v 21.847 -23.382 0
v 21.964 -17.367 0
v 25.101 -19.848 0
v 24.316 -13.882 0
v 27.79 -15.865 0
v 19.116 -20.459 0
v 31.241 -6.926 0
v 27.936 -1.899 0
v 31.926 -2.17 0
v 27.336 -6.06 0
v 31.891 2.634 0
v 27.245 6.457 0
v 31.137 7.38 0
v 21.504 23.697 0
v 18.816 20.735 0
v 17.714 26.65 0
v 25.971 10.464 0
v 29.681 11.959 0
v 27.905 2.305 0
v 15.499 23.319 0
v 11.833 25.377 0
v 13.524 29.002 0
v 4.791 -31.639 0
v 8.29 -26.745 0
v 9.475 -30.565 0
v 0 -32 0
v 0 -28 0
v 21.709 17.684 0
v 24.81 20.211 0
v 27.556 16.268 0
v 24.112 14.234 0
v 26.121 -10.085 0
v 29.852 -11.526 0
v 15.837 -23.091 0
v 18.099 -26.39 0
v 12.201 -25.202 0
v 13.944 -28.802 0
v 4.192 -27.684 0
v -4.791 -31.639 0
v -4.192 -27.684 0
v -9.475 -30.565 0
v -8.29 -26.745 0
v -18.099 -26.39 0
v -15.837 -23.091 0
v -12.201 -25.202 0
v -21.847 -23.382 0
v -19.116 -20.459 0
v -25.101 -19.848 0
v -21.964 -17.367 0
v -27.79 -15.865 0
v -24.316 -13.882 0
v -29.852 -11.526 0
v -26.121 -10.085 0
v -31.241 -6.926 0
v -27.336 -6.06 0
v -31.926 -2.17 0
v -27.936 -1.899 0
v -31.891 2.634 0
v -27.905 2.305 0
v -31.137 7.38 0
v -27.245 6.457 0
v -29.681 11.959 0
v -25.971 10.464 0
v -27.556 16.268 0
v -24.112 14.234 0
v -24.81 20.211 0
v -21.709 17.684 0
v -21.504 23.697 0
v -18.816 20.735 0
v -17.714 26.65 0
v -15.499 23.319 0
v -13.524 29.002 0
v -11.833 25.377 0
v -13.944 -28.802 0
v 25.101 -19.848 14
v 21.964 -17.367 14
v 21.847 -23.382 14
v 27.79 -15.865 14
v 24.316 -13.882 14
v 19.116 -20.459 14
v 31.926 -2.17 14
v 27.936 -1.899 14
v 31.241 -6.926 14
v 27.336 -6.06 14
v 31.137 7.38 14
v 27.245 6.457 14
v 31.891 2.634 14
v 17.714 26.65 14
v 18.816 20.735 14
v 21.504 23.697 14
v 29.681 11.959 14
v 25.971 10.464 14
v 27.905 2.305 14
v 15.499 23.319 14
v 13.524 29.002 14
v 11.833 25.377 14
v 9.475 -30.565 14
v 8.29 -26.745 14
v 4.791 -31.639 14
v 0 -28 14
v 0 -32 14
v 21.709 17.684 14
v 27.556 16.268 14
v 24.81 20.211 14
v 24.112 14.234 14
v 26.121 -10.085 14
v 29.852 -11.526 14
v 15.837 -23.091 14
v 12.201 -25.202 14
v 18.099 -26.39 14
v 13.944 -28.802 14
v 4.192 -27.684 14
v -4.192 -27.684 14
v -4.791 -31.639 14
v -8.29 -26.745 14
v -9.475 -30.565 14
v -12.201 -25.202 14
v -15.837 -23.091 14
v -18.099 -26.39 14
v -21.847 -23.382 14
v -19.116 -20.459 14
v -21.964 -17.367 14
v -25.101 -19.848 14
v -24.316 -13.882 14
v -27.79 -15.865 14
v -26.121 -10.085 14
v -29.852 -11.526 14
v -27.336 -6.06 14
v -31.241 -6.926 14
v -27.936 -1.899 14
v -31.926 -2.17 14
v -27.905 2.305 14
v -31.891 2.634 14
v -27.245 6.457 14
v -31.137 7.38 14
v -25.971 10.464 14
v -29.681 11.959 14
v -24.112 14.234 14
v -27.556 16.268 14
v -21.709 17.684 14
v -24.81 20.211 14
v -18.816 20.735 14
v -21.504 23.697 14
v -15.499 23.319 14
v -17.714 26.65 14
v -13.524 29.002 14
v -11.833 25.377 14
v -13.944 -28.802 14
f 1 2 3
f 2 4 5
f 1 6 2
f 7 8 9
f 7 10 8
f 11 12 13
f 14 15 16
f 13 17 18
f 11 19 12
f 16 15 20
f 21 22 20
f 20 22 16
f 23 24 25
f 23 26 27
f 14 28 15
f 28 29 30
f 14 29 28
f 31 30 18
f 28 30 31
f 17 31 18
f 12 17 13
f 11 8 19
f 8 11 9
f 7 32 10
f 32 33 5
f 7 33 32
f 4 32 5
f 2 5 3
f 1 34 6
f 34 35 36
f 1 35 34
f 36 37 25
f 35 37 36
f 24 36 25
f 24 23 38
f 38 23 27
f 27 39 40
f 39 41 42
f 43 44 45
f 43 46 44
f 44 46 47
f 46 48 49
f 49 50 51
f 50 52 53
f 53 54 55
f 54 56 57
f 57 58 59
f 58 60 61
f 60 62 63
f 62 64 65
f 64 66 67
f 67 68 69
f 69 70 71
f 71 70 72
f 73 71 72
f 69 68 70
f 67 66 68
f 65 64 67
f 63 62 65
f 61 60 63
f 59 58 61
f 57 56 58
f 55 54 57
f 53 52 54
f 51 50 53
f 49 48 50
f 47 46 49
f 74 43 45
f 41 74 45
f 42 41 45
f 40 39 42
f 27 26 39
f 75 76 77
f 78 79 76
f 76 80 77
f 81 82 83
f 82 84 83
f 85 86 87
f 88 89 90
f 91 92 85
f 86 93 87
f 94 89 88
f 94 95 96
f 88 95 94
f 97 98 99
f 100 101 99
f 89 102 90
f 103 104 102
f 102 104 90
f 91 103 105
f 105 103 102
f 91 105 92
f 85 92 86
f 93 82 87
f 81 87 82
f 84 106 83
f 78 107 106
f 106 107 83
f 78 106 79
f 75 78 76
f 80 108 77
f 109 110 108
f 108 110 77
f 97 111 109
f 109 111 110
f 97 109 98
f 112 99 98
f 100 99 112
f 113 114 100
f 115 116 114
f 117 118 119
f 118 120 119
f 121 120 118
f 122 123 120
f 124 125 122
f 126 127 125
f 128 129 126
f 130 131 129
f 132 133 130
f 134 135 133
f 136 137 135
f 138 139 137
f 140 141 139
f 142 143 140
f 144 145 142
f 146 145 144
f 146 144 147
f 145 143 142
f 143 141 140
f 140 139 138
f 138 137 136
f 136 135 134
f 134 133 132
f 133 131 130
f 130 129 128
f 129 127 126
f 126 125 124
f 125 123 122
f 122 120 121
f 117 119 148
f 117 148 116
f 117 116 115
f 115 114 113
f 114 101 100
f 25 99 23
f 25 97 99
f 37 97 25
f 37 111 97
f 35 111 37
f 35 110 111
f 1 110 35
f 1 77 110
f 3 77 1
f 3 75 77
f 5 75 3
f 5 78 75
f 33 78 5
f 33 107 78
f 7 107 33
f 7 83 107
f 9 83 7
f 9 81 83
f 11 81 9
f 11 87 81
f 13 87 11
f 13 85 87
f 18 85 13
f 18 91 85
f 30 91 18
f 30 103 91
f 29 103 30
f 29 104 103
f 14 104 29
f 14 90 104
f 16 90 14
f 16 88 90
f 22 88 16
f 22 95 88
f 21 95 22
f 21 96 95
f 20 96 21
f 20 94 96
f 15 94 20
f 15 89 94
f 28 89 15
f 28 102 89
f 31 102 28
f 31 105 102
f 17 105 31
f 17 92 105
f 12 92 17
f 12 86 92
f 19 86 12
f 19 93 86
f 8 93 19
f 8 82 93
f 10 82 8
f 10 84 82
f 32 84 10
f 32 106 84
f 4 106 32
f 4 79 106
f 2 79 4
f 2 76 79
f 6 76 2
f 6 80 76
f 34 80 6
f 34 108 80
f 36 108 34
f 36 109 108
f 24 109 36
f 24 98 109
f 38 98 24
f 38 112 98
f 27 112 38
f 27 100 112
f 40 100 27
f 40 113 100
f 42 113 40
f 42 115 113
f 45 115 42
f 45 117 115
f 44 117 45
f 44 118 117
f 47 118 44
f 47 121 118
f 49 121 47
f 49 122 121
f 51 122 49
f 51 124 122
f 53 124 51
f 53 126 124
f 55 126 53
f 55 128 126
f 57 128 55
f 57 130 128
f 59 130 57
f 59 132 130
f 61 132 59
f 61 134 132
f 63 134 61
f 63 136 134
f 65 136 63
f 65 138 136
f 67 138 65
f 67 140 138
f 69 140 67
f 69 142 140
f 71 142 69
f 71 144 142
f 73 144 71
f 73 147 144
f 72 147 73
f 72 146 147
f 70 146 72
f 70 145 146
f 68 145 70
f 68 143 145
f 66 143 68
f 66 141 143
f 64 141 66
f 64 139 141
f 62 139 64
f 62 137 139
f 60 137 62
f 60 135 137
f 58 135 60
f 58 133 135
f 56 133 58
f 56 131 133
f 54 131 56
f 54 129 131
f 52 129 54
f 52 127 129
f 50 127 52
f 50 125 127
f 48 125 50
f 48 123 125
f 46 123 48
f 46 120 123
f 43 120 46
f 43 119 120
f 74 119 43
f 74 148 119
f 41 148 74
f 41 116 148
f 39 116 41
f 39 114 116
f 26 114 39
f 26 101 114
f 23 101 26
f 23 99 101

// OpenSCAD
$fn = 32;

// ----------------------------------------------------------------------
// Spring clip: 64 mm outside, 4 mm band, 50 degree opening
// ----------------------------------------------------------------------

// --- parameters (mm) ---
outer_r = 32;             // clip outside radius
inner_r = 28;             // clip bore radius
band = 4;                 // band thickness
clip_w = 14;              // clip width
opening = 50;             // opening angle

clip_profile = [[-13.524, 29.002], [-17.714, 26.65], [-21.504, 23.697], [-24.81, 20.211], [-27.556, 16.268], [-29.681, 11.959], [-31.137, 7.38], [-31.891, 2.634], [-31.926, -2.17], [-31.241, -6.926], [-29.852, -11.526], [-27.79, -15.865], [-25.101, -19.848], [-21.847, -23.382], [-18.099, -26.39], [-13.944, -28.802], [-9.475, -30.565], [-4.791, -31.639], [0, -32], [4.791, -31.639], [9.475, -30.565], [13.944, -28.802], [18.099, -26.39], [21.847, -23.382], [25.101, -19.848], [27.79, -15.865], [29.852, -11.526], [31.241, -6.926], [31.926, -2.17], [31.891, 2.634], [31.137, 7.38], [29.681, 11.959], [27.556, 16.268], [24.81, 20.211], [21.504, 23.697], [17.714, 26.65], [13.524, 29.002], [11.833, 25.377], [15.499, 23.319], [18.816, 20.735], [21.709, 17.684], [24.112, 14.234], [25.971, 10.464], [27.245, 6.457], [27.905, 2.305], [27.936, -1.899], [27.336, -6.06], [26.121, -10.085], [24.316, -13.882], [21.964, -17.367], [19.116, -20.459], [15.837, -23.091], [12.201, -25.202], [8.29, -26.745], [4.192, -27.684], [0, -28], [-4.192, -27.684], [-8.29, -26.745], [-12.201, -25.202], [-15.837, -23.091], [-19.116, -20.459], [-21.964, -17.367], [-24.316, -13.882], [-26.121, -10.085], [-27.336, -6.06], [-27.936, -1.899], [-27.905, 2.305], [-27.245, 6.457], [-25.971, 10.464], [-24.112, 14.234], [-21.709, 17.684], [-18.816, 20.735], [-15.499, 23.319], [-11.833, 25.377]];

difference() {
  union() {
    linear_extrude(height = clip_w) polygon(clip_profile);
  }
}
